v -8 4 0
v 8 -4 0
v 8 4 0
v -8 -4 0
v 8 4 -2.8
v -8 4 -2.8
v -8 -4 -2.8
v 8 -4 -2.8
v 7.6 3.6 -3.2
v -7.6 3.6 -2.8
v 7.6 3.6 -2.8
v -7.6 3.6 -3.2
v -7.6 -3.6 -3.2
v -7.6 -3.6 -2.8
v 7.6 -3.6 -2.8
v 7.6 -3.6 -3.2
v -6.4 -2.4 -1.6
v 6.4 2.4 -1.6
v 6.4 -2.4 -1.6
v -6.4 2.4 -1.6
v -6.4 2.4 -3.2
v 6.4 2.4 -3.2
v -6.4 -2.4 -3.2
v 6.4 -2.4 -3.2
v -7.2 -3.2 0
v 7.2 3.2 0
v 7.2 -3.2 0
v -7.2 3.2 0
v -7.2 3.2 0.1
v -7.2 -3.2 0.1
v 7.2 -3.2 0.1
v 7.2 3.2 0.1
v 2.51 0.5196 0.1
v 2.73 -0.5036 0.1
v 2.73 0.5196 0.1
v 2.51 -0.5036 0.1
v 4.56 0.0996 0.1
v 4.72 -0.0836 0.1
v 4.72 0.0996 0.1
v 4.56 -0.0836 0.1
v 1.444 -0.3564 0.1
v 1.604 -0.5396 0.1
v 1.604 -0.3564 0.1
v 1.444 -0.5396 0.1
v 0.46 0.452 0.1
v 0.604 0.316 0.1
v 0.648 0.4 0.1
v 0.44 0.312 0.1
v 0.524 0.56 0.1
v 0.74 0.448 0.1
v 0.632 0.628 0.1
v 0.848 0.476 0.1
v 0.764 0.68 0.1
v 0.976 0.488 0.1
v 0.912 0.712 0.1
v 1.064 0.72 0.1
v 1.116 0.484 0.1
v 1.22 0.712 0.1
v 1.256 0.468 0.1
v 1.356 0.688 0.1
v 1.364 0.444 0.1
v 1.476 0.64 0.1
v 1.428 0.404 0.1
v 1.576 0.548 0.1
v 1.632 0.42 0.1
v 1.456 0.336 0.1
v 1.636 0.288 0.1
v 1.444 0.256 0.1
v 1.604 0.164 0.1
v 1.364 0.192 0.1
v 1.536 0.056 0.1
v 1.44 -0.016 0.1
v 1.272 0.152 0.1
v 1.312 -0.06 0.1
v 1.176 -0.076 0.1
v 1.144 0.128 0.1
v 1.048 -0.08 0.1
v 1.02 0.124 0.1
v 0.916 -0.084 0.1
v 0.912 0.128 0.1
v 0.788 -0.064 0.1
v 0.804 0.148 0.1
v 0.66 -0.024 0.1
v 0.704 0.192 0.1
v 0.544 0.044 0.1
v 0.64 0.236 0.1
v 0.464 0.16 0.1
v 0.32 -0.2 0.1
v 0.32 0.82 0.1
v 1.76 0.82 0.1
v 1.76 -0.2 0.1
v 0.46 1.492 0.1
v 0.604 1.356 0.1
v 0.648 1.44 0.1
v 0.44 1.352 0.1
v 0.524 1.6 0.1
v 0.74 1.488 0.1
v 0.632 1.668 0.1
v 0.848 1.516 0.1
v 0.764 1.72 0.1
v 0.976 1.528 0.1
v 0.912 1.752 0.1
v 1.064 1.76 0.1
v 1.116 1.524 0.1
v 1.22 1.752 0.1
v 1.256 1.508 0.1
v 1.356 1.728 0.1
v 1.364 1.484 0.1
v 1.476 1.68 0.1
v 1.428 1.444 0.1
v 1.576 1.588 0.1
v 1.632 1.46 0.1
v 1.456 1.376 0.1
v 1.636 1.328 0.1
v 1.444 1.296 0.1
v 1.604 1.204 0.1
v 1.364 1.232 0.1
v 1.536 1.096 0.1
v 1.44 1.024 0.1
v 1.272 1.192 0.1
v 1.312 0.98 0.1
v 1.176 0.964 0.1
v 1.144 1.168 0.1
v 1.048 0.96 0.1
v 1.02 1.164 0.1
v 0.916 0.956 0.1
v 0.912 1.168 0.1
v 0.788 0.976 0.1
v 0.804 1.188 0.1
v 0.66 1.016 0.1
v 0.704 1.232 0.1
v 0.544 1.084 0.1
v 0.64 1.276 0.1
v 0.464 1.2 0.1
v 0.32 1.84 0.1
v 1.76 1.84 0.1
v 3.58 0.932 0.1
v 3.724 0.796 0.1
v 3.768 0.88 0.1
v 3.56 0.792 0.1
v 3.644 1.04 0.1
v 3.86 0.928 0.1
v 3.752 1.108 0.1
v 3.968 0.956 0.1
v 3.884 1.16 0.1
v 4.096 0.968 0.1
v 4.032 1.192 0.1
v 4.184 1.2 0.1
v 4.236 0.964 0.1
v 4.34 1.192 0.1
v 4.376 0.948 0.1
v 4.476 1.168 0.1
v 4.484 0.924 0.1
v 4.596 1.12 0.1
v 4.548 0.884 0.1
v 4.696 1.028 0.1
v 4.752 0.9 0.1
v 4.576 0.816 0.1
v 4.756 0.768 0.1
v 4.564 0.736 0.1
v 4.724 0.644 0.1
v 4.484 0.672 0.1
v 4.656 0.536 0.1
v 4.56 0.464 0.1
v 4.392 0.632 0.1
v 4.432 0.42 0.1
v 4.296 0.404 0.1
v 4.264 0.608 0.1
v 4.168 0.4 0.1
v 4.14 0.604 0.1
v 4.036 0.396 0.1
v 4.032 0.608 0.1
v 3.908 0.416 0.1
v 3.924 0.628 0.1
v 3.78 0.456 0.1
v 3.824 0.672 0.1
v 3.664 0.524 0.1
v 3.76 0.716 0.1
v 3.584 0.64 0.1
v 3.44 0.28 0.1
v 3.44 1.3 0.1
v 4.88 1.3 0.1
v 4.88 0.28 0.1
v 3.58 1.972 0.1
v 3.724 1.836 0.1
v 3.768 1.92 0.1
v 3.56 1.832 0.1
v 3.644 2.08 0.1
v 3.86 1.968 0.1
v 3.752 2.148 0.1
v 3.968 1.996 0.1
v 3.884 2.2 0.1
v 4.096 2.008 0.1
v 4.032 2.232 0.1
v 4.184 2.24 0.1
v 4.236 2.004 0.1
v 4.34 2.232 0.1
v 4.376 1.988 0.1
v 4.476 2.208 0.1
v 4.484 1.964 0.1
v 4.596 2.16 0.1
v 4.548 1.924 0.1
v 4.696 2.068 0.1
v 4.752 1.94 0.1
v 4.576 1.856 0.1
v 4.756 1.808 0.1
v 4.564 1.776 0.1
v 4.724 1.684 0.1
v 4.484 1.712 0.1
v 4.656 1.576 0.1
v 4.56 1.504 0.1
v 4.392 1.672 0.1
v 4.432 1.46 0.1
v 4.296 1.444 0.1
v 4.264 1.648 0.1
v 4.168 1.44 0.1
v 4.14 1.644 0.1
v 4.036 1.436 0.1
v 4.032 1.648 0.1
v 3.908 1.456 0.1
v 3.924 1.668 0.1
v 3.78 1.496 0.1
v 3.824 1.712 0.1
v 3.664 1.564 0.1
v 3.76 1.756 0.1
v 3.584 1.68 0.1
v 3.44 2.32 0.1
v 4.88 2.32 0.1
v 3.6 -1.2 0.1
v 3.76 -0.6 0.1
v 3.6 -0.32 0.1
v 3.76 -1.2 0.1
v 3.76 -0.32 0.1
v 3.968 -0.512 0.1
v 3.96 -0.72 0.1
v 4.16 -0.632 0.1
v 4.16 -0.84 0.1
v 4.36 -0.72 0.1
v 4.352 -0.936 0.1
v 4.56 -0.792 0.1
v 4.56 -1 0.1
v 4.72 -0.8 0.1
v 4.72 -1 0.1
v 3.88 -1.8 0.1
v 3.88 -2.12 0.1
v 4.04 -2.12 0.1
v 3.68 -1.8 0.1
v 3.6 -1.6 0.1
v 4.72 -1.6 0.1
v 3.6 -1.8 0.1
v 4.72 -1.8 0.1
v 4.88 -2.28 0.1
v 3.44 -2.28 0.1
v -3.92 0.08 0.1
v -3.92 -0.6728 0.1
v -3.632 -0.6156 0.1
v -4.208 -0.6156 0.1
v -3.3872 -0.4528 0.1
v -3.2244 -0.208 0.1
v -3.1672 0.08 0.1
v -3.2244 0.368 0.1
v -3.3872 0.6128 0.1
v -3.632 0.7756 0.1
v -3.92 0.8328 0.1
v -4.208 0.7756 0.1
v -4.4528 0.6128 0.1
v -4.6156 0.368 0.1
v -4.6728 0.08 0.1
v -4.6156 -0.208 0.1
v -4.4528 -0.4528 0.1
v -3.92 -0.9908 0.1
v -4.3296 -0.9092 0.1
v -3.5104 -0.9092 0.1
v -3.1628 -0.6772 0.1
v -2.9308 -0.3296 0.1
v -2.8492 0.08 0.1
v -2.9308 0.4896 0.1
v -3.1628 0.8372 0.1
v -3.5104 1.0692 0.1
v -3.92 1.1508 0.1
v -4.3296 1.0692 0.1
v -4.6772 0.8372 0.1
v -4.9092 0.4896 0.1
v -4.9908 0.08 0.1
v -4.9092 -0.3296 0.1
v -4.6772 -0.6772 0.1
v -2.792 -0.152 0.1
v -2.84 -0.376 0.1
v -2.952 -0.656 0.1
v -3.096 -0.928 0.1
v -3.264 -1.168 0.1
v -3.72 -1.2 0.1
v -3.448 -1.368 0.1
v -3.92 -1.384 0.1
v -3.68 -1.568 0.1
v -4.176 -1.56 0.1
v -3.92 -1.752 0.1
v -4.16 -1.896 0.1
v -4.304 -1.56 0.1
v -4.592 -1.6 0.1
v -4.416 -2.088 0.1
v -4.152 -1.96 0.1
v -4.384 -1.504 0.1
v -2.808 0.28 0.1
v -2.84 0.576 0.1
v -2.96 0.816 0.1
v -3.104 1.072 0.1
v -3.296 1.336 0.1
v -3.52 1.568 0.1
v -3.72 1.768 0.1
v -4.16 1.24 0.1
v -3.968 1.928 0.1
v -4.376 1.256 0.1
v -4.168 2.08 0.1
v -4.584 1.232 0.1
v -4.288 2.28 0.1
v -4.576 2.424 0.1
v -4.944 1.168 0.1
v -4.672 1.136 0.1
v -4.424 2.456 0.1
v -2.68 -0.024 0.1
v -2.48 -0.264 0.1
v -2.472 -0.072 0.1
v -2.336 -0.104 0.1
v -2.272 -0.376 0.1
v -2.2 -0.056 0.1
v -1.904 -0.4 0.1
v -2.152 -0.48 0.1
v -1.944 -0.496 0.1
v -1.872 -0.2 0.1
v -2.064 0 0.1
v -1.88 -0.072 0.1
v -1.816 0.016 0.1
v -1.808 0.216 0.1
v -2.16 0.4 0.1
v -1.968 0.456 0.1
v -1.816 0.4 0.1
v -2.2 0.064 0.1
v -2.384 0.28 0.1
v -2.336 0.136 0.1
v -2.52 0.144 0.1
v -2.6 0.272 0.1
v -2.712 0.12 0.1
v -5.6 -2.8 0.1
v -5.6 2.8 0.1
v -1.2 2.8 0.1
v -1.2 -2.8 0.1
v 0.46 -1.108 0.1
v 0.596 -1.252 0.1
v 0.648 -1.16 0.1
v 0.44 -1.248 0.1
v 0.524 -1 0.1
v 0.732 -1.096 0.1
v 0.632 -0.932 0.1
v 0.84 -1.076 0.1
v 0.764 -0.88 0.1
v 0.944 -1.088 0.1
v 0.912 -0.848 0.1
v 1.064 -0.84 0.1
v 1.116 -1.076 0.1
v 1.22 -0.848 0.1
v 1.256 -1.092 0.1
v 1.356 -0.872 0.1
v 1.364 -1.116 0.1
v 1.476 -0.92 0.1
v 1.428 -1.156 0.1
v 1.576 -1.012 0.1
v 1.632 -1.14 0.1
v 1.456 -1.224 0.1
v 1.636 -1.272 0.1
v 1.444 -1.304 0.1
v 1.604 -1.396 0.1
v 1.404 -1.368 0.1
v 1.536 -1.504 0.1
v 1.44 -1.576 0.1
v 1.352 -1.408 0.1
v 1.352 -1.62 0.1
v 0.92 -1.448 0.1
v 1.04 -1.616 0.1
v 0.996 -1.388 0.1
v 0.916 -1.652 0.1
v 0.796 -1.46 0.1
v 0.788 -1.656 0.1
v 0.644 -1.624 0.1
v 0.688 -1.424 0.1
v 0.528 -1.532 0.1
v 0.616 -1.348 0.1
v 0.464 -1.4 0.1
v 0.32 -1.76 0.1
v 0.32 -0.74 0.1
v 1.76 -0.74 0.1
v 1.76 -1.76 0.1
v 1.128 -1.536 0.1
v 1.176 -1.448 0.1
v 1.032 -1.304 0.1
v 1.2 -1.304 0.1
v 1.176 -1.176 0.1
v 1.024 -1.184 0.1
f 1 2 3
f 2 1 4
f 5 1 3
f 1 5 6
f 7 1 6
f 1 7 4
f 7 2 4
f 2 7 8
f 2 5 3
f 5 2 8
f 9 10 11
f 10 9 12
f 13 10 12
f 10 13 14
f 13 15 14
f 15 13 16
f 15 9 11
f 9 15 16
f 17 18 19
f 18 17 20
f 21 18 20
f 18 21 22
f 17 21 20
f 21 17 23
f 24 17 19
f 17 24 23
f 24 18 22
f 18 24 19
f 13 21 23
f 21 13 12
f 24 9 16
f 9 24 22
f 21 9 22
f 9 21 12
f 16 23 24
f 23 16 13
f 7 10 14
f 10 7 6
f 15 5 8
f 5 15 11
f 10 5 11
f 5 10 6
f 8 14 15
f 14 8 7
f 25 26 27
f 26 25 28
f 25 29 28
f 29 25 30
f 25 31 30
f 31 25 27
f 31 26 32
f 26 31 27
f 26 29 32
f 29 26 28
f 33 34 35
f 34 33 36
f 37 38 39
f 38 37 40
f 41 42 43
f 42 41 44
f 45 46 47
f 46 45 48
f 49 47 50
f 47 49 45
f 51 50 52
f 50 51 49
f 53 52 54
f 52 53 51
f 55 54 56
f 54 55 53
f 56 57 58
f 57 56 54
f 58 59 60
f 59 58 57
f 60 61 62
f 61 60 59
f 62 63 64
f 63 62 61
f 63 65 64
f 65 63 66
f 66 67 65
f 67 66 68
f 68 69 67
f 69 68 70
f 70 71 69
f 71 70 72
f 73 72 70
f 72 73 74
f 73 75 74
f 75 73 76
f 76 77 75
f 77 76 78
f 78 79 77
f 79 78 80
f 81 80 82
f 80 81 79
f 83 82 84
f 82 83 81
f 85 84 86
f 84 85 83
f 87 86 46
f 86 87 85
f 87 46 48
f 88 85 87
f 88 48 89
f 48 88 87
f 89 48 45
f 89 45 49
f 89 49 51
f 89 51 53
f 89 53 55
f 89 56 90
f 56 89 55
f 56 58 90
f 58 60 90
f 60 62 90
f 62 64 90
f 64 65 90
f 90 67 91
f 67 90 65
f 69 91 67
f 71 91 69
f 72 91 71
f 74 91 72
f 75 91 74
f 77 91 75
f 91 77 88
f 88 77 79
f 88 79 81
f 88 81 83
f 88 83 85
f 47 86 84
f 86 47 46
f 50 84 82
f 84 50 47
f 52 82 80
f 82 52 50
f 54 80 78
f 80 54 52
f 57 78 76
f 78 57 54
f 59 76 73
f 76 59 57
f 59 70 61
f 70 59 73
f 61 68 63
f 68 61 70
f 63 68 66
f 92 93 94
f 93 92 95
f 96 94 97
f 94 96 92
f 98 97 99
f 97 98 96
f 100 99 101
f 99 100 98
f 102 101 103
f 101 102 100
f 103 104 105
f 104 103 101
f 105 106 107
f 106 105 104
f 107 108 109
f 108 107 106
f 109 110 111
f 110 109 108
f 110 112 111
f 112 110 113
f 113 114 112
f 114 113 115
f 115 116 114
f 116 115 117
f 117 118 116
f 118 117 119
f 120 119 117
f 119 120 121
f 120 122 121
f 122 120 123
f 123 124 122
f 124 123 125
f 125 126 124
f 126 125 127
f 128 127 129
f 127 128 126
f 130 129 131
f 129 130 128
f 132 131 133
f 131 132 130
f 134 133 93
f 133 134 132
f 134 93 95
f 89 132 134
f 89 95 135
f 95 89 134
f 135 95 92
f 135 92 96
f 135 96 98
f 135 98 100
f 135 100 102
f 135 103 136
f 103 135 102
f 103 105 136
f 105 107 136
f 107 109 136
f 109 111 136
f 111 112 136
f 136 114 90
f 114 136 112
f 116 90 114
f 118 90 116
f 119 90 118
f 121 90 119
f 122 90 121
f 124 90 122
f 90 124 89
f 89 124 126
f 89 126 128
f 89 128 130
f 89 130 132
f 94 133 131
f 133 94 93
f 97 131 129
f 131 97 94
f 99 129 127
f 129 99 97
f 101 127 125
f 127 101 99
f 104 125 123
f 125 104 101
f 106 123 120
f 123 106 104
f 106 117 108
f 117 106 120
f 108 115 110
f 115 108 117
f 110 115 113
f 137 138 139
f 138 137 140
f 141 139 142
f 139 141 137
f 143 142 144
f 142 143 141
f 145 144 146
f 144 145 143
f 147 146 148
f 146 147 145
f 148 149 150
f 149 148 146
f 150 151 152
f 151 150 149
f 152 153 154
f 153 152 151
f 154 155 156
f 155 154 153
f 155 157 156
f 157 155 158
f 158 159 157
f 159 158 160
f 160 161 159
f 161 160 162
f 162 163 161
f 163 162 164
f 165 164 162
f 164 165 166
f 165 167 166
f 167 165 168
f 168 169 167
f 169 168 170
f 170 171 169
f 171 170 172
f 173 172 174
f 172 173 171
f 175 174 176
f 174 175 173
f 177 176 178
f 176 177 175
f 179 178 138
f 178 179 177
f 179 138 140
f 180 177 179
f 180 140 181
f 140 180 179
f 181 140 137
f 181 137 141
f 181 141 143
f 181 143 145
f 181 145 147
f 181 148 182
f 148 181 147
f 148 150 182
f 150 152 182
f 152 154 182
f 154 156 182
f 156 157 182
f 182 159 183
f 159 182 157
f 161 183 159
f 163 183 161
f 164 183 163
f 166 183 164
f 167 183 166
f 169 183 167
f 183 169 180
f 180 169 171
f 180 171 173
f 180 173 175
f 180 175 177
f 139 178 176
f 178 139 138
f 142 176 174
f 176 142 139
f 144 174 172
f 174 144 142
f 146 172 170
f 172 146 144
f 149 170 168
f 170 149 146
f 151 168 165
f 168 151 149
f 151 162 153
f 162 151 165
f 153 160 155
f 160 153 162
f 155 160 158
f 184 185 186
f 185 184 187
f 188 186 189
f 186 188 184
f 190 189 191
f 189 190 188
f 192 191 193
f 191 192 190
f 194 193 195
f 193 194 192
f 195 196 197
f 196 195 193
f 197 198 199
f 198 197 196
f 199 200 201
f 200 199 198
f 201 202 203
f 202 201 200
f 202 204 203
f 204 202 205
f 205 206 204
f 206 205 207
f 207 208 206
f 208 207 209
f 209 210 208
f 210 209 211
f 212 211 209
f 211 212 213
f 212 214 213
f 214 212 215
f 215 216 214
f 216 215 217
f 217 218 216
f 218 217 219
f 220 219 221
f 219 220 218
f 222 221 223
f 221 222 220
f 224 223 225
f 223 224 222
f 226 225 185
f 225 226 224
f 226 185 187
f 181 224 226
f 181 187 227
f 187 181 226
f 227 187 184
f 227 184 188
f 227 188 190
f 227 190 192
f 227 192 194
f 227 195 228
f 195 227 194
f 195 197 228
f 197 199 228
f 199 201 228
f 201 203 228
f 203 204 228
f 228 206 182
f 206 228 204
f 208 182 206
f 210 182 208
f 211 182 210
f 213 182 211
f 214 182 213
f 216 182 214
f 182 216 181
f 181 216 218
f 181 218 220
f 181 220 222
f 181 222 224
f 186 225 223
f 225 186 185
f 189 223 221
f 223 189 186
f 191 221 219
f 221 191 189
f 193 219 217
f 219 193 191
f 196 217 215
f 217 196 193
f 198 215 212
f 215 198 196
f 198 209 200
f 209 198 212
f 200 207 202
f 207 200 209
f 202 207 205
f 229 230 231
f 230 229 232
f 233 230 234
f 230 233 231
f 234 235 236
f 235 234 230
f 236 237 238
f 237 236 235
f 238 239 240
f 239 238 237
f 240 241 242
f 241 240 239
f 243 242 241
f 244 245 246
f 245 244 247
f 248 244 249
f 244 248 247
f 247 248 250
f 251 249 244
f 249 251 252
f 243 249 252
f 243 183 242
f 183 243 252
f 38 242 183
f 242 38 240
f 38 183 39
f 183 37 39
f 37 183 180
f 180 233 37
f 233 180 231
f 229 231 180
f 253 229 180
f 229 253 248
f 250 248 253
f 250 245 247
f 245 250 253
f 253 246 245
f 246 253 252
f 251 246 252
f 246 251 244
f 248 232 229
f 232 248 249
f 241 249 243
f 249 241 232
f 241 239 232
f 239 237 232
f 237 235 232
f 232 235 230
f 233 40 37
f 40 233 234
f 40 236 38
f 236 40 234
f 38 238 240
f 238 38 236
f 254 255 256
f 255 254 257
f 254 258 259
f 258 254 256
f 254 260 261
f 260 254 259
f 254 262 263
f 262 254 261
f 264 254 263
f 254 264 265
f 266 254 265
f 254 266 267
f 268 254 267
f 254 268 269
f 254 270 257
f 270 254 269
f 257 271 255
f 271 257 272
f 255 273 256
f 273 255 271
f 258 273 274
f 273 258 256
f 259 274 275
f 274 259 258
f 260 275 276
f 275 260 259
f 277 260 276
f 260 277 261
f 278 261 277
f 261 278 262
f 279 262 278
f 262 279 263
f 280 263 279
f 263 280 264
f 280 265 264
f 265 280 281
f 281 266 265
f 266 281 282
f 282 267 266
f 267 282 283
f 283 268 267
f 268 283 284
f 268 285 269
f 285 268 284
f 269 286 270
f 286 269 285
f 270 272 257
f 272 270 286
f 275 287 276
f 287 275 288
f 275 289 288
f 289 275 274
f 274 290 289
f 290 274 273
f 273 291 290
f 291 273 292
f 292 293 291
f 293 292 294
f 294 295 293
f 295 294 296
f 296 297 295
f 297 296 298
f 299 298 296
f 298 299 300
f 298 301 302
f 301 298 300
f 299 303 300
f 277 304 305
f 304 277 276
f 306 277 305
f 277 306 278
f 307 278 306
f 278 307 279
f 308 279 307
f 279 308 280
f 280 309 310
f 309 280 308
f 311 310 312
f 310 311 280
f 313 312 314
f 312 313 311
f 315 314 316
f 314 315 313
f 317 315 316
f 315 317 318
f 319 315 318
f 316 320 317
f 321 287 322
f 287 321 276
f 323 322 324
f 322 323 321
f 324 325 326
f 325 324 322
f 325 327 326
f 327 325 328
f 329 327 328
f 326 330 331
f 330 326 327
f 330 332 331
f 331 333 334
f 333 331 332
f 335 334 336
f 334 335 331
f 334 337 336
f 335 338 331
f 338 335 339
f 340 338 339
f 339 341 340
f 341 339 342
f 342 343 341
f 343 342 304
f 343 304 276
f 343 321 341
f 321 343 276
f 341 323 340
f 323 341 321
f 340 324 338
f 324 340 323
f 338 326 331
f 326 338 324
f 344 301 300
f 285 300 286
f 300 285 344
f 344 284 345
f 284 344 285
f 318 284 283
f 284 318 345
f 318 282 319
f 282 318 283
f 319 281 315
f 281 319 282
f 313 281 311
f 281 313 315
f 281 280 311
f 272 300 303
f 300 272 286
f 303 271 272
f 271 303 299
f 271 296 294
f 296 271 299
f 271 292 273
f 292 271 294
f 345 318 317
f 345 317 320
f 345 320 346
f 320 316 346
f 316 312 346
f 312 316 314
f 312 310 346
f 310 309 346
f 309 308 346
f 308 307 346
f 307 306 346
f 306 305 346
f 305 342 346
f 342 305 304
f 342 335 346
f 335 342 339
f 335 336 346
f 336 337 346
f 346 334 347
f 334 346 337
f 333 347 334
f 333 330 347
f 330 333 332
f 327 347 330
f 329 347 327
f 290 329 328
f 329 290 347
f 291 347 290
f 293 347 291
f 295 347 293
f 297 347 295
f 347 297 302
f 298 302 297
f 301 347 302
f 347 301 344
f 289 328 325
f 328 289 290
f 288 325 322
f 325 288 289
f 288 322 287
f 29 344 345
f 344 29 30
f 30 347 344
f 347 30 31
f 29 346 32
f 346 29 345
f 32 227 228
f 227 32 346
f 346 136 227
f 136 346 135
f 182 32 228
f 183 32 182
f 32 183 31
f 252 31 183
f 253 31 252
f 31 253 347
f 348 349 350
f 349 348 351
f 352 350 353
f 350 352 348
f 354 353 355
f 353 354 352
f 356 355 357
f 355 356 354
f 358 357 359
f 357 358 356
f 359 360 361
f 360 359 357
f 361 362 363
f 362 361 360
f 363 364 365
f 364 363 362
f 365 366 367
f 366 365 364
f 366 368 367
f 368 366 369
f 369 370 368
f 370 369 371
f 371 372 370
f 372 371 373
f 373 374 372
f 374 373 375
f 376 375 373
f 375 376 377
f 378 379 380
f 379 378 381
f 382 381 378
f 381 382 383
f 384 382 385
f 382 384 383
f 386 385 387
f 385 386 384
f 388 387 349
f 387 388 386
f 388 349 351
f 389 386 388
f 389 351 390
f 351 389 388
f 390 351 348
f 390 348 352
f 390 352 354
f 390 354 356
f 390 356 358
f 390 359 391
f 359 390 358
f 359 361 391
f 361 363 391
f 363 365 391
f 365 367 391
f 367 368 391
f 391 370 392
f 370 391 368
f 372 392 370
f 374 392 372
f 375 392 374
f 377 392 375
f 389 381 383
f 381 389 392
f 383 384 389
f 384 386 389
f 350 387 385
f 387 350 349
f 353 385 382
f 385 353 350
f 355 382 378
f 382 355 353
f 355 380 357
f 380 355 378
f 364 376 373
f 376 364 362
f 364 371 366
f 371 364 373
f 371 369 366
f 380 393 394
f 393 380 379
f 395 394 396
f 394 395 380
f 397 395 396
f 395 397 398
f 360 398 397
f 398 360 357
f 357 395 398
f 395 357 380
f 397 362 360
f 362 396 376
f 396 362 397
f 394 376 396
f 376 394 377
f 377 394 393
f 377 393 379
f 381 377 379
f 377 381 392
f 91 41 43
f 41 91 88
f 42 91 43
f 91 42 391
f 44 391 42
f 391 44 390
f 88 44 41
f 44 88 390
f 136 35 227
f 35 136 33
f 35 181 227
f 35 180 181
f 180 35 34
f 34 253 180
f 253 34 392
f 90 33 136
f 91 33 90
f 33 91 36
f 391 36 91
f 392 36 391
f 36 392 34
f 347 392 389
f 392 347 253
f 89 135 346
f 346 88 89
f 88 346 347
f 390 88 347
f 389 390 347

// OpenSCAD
use <../lib.scad>
use <3069b.scad>
use <4629677c.scad>
function ldraw_lib__3069bd15() = [
// 0 Tile  1 x  2 with Golden Post Horn and "9.00 - 17.00" Sticker
// 0 Name: 3069bd15.dat
// 0 Author: Takeshi Takahashi [RainbowDolphin]
// 0 !LDRAW_ORG Shortcut UPDATE 2024-11
// 0 !LICENSE Licensed under CC BY 4.0 : see CAreadme.txt
// 
// 0 BFC CERTIFY CCW
  [0,"BFC","CERTIFY"],
  [0,"BFC","CCW"],
// 
// 0 !CATEGORY Sticker Shortcut
// 0 !KEYWORDS Bricklink 3069pb0530, Post office, set 10222, Winter Village
// 
// 0 !HISTORY 2024-12-30 [OrionP] Official Update 2024-11
// 
// 1 16 0 0 0 1 0 0 0 1 0 0 0 1 3069b.dat
  [1,16,0,0,0,1,0,0,0,1,0,0,0,1, ldraw_lib__3069b()],
// 1 16 0 0 0 0 0 -1 0 1 0 1 0 0 4629677c.dat
  [1,16,0,0,0,0,0,-1,0,1,0,1,0,0, ldraw_lib__4629677c()],
];
module ldraw_lib__3069bd15(step=0, col=false, unit=2/5, alt=false, line=0.2, solid=!$preview)
    makepoly(ldraw_lib__3069bd15(), step=step, col=col, unit=unit, alt=alt, line=line, solid=solid);
ldraw_lib__3069bd15(line=0.2);
